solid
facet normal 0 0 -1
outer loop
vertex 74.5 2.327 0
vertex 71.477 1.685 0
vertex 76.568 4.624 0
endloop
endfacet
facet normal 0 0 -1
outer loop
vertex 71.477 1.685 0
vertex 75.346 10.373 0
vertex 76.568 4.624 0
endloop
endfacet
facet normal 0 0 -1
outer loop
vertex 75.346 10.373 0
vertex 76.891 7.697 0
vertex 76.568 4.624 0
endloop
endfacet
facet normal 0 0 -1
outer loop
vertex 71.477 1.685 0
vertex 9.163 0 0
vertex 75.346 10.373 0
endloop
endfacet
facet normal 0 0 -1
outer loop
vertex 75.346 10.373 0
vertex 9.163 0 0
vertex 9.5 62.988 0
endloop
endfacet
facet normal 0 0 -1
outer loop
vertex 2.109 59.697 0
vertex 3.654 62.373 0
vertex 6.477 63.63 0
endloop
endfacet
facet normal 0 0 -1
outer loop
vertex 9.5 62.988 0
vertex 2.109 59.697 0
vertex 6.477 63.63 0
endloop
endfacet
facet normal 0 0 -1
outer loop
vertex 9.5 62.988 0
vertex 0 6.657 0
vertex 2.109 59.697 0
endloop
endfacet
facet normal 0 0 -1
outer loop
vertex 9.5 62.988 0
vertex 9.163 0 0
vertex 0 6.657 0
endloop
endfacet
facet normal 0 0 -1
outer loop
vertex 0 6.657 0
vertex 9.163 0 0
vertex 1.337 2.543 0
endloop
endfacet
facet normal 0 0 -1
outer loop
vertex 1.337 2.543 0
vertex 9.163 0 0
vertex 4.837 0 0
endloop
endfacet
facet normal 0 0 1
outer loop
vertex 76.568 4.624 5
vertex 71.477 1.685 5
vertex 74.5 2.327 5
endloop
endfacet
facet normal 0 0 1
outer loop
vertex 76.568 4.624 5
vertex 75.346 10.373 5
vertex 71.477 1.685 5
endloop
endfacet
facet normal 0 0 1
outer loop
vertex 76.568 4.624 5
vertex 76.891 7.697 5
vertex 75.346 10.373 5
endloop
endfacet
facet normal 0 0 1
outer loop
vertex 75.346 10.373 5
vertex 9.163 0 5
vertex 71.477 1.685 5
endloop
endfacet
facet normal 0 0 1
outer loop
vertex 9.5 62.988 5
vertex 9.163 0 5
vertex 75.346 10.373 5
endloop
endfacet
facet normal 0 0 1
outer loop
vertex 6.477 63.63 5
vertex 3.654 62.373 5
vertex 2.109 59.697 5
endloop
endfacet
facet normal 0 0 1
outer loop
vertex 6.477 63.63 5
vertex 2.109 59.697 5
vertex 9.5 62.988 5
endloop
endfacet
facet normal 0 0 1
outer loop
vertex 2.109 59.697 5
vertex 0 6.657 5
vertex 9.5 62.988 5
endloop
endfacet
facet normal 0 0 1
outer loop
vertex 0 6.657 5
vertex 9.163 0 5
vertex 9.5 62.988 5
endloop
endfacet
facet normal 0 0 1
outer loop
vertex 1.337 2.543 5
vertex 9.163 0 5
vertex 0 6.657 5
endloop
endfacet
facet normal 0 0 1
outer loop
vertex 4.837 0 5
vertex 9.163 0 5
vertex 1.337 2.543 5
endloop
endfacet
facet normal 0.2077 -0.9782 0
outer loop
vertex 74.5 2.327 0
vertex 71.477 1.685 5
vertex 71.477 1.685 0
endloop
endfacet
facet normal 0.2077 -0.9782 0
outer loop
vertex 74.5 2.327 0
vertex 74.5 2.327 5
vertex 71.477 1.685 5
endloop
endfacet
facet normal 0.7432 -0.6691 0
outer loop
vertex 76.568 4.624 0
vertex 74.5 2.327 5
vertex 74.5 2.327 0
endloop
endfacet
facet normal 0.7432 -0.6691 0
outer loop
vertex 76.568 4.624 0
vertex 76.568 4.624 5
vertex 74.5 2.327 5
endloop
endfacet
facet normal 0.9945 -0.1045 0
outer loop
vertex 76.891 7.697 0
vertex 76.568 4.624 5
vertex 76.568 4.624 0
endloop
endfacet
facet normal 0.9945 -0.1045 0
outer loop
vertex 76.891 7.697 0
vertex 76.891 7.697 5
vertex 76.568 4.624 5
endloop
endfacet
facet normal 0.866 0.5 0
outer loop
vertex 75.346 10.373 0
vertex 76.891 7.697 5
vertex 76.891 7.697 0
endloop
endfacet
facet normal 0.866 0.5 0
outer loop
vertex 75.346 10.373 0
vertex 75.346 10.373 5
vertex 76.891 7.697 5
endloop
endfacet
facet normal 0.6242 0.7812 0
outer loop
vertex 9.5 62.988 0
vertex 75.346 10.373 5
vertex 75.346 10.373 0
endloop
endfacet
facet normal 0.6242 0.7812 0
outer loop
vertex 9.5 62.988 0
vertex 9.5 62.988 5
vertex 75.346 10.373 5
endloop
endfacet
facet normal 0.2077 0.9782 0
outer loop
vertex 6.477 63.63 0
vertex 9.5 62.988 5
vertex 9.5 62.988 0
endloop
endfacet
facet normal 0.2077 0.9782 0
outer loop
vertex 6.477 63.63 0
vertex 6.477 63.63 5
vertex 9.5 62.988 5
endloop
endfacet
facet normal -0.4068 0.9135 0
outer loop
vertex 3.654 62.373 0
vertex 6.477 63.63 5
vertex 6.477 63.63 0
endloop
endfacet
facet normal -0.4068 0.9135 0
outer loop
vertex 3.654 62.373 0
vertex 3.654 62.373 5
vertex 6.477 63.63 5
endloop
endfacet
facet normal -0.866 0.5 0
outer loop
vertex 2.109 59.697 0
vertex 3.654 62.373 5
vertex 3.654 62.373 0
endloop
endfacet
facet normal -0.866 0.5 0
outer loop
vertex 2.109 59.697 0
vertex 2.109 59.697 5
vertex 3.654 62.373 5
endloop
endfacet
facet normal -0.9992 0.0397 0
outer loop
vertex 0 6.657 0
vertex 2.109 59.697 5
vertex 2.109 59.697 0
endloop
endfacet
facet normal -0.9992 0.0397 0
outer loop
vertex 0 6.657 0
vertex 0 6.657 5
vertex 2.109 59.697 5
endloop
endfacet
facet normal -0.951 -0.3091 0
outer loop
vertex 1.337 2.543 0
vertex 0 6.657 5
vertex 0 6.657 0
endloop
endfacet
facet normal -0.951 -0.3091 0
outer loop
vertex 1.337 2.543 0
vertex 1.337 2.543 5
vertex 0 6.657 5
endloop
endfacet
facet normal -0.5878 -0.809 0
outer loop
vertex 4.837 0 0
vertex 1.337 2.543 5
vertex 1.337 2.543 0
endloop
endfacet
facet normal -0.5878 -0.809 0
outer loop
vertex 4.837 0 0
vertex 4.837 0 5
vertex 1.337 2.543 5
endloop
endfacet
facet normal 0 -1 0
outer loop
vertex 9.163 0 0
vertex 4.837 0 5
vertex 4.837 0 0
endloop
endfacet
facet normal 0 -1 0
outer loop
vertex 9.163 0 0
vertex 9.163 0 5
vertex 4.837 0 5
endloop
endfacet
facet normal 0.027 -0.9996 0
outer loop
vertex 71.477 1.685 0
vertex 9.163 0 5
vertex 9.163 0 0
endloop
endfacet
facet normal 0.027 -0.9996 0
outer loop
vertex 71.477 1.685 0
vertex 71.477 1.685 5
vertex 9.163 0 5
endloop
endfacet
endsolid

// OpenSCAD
$fn = 32;

// ----------------------------------------------------------------------
// Lever arm: two bosses 14 and 10 mm, 65 mm between centres
// ----------------------------------------------------------------------

// --- parameters (mm) ---
profile_height = 5;       // extrusion height
profile_points = 13;      // points of the closed outline

profile = [[0, 6.657], [1.337, 2.543], [4.837, 0], [9.163, 0], [71.477, 1.685], [74.5, 2.327], [76.568, 4.624], [76.891, 7.697], [75.346, 10.373], [9.5, 62.988], [6.477, 63.63], [3.654, 62.373], [2.109, 59.697]];  // single closed polygon, 13 points, counter clockwise

// --- the one profile operation ---
linear_extrude(height = profile_height) polygon(points = profile);
